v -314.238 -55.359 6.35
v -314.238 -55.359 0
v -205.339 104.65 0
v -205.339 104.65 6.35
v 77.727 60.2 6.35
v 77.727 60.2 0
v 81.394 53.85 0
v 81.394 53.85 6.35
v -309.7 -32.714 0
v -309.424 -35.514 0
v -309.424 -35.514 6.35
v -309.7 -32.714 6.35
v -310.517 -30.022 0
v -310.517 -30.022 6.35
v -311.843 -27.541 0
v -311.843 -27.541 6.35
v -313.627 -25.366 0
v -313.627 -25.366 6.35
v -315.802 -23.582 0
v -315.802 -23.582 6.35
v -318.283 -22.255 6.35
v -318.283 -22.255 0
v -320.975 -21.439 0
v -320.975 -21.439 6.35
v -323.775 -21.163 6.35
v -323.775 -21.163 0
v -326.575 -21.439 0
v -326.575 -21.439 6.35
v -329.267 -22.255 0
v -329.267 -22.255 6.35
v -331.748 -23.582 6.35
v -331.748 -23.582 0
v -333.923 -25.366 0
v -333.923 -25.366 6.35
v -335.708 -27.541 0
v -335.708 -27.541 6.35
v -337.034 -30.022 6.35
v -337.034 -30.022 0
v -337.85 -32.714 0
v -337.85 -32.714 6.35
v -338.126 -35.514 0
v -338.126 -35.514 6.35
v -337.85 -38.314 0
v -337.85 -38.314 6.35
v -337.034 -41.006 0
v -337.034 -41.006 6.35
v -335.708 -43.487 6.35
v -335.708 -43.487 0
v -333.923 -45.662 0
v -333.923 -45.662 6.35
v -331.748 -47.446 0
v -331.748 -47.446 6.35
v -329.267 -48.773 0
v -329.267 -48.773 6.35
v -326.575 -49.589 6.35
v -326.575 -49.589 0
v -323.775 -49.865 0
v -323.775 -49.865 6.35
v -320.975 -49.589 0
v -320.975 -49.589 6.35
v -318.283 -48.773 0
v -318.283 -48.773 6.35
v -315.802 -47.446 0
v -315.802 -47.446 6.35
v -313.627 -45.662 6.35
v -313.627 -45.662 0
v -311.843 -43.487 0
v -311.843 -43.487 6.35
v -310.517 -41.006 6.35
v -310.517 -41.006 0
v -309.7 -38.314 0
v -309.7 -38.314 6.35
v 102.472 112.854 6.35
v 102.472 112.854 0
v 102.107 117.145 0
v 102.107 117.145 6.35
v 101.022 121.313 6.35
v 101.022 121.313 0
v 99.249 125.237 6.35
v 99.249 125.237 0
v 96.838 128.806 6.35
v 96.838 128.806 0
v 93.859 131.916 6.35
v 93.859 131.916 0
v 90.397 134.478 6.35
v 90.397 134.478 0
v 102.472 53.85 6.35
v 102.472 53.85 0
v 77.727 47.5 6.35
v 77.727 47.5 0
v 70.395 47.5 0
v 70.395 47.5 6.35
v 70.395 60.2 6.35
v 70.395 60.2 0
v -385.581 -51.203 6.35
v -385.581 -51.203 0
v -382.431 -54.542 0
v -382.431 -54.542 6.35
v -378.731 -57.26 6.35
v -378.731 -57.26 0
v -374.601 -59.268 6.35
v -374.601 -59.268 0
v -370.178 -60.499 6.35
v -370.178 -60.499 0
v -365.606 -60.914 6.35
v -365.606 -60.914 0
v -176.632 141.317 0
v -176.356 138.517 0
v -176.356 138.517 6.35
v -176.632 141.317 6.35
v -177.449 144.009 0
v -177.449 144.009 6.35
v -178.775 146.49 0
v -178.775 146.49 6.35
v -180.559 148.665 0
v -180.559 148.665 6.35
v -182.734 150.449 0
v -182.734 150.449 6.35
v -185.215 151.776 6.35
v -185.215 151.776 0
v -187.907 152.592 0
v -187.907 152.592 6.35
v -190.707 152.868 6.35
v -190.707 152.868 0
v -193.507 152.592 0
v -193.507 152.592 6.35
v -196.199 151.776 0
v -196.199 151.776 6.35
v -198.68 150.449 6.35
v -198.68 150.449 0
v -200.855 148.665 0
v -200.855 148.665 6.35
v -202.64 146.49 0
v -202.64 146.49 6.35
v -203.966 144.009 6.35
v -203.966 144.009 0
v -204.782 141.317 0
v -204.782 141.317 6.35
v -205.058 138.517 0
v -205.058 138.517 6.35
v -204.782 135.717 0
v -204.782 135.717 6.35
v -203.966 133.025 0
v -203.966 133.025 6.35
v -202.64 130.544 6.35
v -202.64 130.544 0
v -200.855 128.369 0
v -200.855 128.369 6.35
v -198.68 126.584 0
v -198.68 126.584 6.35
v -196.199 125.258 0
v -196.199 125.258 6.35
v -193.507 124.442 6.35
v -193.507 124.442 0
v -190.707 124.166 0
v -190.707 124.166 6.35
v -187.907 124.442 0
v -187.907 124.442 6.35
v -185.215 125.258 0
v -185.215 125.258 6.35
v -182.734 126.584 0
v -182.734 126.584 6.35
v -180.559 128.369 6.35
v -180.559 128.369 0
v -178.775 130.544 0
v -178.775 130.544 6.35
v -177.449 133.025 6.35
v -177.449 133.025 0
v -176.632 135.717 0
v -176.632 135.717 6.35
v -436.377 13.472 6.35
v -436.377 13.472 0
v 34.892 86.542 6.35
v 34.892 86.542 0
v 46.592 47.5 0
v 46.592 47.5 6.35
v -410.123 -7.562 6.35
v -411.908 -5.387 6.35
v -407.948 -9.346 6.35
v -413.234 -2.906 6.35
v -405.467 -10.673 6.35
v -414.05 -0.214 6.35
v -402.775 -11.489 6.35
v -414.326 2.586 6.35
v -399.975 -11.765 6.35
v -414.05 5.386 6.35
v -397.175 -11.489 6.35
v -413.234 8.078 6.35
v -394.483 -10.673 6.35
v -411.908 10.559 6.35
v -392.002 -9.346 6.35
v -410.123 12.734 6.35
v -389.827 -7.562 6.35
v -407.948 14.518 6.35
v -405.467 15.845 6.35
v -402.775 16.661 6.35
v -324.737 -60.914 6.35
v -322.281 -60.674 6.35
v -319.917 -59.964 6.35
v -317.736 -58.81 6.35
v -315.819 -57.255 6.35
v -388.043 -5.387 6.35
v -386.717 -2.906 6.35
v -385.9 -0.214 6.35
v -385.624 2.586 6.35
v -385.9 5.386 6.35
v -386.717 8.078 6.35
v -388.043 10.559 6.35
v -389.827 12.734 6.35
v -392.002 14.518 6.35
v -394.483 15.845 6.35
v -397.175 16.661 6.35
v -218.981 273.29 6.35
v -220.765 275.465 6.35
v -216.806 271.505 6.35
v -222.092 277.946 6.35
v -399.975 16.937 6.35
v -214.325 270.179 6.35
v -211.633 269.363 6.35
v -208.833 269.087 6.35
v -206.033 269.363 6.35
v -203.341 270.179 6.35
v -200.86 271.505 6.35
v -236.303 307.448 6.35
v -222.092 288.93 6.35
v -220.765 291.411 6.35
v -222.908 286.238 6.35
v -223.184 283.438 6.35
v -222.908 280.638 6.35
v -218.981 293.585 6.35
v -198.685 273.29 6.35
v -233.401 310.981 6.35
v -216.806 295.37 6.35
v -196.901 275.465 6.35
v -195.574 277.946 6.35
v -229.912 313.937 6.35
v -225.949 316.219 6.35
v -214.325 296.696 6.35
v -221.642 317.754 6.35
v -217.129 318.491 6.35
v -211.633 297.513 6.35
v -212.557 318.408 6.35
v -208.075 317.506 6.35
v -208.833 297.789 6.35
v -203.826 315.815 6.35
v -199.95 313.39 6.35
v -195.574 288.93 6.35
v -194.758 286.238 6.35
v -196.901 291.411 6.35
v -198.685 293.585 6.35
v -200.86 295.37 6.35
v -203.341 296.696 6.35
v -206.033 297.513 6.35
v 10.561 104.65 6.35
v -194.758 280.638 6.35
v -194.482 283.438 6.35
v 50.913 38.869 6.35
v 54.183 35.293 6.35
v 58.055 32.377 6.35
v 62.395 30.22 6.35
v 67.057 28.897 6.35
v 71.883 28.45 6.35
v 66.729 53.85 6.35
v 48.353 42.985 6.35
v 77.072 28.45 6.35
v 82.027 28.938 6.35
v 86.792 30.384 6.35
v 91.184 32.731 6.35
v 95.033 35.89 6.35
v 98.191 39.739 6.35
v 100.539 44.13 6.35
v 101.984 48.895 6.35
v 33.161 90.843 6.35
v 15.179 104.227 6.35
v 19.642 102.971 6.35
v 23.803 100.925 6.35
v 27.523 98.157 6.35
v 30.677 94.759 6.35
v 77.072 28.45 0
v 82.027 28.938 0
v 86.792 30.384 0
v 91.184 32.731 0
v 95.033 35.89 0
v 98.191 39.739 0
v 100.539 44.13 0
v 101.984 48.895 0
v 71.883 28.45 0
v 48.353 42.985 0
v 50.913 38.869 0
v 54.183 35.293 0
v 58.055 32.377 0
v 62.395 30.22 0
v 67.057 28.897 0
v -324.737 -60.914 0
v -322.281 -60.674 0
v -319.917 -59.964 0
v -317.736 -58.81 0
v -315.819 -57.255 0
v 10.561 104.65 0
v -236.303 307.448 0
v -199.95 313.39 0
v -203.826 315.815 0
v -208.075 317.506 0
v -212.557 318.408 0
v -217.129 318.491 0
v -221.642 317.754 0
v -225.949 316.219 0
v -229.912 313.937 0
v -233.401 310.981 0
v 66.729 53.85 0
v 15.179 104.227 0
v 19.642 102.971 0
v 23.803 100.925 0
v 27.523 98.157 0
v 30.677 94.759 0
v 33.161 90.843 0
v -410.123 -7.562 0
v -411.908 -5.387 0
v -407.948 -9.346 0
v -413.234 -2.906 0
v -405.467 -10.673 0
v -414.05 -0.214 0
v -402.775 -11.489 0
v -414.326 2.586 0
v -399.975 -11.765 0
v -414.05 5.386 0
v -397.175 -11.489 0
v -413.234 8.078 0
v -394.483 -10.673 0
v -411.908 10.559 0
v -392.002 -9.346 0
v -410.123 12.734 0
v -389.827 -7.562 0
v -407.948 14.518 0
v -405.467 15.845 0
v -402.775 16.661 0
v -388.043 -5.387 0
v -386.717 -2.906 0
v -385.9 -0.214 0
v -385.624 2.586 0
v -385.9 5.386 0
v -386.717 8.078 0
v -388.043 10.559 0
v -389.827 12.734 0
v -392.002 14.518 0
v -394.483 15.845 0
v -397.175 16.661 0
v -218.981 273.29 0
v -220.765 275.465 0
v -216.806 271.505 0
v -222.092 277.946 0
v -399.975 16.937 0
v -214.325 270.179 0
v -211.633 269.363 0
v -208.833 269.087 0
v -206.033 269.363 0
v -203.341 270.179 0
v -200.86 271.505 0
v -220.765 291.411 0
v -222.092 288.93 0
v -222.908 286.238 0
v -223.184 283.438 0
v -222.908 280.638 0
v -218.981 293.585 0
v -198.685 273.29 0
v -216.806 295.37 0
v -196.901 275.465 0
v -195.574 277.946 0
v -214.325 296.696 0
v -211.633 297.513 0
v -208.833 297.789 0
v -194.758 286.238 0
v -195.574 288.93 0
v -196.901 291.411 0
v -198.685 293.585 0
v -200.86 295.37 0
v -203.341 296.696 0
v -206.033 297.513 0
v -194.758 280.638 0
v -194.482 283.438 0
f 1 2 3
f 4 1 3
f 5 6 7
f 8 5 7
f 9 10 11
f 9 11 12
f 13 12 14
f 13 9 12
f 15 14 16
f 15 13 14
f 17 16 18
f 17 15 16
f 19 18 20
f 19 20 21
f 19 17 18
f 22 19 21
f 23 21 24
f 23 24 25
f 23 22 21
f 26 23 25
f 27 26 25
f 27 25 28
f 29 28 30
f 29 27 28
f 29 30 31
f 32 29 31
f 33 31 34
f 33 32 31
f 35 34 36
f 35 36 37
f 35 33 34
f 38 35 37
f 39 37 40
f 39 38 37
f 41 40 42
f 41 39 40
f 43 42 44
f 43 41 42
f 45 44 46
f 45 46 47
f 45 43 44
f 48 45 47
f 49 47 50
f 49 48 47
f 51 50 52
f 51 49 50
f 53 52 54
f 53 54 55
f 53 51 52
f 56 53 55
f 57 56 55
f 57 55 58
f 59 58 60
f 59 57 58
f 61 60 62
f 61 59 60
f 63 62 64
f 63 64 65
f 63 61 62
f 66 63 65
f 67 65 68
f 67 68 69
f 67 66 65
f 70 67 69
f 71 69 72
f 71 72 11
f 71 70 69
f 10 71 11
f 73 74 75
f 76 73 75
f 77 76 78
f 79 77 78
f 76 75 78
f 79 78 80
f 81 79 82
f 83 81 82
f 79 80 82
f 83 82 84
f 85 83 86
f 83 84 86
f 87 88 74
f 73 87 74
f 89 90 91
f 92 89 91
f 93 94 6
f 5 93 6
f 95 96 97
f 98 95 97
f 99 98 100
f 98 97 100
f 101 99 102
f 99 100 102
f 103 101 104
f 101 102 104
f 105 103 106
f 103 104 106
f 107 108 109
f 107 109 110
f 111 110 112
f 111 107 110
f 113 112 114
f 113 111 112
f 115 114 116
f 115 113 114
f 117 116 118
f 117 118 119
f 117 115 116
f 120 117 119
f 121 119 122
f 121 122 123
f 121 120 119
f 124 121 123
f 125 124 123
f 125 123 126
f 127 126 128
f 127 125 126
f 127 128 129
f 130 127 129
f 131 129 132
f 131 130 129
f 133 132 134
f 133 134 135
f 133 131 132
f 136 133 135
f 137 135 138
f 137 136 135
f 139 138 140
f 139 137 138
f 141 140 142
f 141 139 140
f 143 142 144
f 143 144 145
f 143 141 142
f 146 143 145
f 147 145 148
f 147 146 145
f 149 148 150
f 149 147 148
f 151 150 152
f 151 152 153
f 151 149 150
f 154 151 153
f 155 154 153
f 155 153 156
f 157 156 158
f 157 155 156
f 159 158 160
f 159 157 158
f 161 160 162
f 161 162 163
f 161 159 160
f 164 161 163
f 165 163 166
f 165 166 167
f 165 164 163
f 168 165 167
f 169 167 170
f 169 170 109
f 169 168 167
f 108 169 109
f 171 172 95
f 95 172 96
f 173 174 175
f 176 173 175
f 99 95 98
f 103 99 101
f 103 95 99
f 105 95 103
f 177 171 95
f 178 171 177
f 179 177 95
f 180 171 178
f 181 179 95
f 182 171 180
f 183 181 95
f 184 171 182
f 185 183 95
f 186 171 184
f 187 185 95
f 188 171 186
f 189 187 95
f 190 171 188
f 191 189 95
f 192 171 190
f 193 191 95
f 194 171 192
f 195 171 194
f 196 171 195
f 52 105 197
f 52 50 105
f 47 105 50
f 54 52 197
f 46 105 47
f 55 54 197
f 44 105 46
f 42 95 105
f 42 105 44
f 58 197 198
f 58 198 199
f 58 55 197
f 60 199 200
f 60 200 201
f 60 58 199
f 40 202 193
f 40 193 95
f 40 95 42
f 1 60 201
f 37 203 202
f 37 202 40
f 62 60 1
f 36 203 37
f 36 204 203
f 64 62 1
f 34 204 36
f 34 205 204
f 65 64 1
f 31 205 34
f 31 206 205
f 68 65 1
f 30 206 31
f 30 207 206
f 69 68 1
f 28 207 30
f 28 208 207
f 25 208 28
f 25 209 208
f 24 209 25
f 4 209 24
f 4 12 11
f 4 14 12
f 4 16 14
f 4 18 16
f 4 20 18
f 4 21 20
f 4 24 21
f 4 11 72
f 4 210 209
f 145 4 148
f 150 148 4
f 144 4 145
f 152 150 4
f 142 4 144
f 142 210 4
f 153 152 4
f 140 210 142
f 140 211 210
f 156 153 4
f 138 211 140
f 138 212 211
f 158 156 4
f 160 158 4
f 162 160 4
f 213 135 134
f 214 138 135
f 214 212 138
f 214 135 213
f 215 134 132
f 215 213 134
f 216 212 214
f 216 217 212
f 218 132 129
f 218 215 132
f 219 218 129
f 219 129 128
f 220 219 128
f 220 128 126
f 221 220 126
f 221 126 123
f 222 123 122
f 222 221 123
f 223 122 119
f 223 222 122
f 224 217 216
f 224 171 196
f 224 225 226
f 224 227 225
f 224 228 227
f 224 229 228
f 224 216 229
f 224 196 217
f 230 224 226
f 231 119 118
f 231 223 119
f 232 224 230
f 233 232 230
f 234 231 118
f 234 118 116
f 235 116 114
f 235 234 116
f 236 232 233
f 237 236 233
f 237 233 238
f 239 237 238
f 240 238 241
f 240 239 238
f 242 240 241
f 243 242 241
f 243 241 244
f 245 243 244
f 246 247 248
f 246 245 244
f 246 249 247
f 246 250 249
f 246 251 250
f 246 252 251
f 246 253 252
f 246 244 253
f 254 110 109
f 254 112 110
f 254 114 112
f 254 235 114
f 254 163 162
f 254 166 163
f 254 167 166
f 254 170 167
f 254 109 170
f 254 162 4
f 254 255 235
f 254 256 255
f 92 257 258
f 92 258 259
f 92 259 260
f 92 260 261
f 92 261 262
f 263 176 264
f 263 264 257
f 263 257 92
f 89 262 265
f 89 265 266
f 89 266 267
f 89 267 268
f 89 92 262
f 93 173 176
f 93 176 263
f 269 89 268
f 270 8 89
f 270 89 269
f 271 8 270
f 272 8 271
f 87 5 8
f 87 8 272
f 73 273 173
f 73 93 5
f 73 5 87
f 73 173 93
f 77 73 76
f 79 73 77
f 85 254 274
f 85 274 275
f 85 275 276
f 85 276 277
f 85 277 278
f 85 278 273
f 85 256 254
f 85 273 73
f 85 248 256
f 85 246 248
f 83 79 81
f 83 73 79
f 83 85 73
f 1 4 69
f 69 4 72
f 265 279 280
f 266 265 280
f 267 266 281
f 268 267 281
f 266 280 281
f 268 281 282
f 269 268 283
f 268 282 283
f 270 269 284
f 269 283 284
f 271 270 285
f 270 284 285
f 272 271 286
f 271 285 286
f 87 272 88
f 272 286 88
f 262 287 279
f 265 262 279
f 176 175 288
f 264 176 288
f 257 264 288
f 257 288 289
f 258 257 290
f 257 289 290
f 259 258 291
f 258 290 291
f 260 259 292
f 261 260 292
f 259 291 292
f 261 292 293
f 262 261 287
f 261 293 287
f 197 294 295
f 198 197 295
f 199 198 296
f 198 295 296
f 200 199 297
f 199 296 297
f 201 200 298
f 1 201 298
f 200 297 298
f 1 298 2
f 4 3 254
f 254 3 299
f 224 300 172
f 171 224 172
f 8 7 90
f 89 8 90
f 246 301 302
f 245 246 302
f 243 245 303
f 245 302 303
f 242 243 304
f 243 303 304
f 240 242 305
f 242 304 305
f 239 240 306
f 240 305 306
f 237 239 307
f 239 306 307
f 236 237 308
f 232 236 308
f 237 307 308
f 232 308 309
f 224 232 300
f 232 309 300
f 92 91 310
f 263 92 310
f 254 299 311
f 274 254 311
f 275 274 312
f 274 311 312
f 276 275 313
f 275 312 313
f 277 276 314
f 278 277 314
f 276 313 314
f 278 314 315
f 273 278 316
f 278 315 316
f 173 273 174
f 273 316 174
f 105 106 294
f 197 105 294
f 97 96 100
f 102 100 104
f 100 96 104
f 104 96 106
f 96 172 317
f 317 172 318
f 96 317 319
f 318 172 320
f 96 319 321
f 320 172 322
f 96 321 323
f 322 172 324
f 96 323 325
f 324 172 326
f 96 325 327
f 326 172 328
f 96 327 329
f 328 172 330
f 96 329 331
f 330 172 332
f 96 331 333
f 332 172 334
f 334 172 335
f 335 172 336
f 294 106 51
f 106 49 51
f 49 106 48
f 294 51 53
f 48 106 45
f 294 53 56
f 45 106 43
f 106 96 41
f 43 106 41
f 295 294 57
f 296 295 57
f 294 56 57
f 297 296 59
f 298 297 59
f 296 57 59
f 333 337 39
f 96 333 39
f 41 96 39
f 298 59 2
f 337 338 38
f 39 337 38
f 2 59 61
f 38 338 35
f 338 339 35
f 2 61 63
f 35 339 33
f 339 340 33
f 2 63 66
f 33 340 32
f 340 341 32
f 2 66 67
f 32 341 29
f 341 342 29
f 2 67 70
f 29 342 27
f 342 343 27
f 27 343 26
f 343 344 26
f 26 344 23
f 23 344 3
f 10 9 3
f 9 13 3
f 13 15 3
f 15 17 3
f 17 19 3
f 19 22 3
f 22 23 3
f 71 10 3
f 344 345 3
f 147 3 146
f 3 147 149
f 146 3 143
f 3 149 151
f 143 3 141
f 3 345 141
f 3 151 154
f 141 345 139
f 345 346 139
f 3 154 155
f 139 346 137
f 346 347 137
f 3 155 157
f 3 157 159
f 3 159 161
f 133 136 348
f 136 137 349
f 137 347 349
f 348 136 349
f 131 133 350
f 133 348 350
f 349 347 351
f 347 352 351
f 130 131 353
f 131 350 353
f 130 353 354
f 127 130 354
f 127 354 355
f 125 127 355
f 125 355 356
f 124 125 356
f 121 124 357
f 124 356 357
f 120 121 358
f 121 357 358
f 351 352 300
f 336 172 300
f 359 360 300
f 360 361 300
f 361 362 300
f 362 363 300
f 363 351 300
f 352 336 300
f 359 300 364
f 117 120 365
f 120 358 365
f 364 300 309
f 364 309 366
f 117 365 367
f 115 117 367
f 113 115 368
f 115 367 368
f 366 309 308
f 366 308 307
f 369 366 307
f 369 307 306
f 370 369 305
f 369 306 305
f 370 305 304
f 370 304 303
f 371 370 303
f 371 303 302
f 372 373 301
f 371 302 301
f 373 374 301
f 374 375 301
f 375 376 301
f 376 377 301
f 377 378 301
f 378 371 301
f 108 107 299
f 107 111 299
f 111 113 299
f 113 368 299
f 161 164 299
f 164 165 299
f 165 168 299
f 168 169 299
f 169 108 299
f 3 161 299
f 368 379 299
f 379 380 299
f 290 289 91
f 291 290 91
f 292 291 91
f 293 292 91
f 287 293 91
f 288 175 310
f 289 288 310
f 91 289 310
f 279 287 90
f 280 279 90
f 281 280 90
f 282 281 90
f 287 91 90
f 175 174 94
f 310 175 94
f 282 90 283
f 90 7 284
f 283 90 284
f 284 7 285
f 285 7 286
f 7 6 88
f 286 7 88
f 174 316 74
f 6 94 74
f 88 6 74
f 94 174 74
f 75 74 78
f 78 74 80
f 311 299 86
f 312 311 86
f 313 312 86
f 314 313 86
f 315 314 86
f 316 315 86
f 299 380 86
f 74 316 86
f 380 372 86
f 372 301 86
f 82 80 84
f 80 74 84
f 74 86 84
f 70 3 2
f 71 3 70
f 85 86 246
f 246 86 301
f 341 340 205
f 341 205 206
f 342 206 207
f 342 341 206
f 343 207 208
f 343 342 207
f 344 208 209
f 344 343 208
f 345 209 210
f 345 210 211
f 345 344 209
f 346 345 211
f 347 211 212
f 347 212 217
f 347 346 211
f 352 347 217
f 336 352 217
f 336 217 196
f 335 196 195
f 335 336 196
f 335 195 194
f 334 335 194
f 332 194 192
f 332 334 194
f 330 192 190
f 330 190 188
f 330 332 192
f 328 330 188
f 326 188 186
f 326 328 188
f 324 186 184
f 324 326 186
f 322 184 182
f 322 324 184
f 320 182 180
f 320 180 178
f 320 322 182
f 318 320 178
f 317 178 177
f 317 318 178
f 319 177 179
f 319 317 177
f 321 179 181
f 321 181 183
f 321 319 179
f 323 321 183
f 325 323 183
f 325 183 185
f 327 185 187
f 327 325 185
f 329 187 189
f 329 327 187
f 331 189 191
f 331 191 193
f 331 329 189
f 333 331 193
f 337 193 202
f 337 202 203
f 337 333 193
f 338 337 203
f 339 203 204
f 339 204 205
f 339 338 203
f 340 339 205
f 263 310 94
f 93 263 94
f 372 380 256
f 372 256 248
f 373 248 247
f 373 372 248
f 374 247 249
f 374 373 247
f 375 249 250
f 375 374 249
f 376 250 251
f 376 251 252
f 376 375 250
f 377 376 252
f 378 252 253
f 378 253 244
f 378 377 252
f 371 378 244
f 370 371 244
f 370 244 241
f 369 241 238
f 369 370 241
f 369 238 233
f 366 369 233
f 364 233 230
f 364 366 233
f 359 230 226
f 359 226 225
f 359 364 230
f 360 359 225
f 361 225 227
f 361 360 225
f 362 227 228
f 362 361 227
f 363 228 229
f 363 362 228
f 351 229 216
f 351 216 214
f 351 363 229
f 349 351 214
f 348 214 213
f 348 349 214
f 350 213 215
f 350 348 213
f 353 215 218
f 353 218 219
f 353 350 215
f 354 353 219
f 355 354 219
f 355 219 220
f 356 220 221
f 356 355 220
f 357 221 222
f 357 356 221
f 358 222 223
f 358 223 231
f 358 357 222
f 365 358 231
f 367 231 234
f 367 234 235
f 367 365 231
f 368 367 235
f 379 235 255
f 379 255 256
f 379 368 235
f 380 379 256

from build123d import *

# Parameters (mm, degrees)
MODEL_R             = 14.351
BOSS_EXTRUDE1_DEPTH = 6.35


with BuildPart() as part:
    # Model → Boss-Extrude1 (new body)
    with BuildSketch(Plane.XY):
        with BuildLine():
            Line((-314.23831963, -55.359484793), (-205.338802982, 104.650248016))
            Line((-205.338802982, 104.650248016), (-11.396613492, 104.650248016))
            Line((-11.396613492, 104.650248016), (-2.138802982, 104.650248016))
            Line((-2.138802982, 104.650248016), (10.561197018, 104.650248016))
            ThreePointArc((10.561197018, 104.650248016), (25.72621731, 99.626267243), (34.892121825, 86.541756641))
            Line((34.892121825, 86.541756641), (46.592108535, 47.500248016))
            ThreePointArc((46.592108535, 47.500248016), (56.051698972, 33.745564192), (71.88314884, 28.450248016))
            Line((71.88314884, 28.450248016), (77.072108535, 28.450248016))
            ThreePointArc((77.072108535, 28.450248016), (95.032620777, 35.889735774), (102.472108535, 53.850248016))
            Line((102.472108535, 53.850248016), (102.472108535, 83.872407327))
            Line((102.472108535, 83.872407327), (102.472108535, 112.853785651))
            ThreePointArc((102.472108535, 112.853785651), (99.24880288, 125.237413065), (90.396972478, 134.478031323))
            Line((90.396972478, 134.478031323), (-199.949582693, 313.389629113))
            ThreePointArc((-199.949582693, 313.389629113), (-219.402189514, 318.224062751), (-236.303247901, 307.447705012))
            Line((-236.303247901, 307.447705012), (-436.377385414, 13.472026599))
            Line((-436.377385414, 13.472026599), (-385.58146606, -51.20282143))
            ThreePointArc((-385.58146606, -51.20282143), (-376.71145599, -58.357541068), (-365.605974805, -60.913979882))
            Line((-365.605974805, -60.913979882), (-324.737451002, -60.913979882))
            ThreePointArc((-324.737451002, -60.913979882), (-318.798508014, -59.439796386), (-314.23831963, -55.359484793))
        make_face()
        with Locations((-323.775189267, -35.513979882)):
            Circle(MODEL_R, mode=Mode.SUBTRACT)
        with Locations((-399.975189267, 2.586020118)):
            Circle(MODEL_R, mode=Mode.SUBTRACT)
        Polygon((77.727371227, 60.200248016), (81.393545437, 53.850248016), (77.727371227, 47.500248016), (70.395022809, 47.500248016), (66.728848599, 53.850248016), (70.395022809, 60.200248016), align=None, mode=Mode.SUBTRACT)
        with Locations((-190.707148919, 138.516914683)):
            Circle(MODEL_R, mode=Mode.SUBTRACT)
        with Locations((-208.832932893, 283.437784316)):
            Circle(MODEL_R, mode=Mode.SUBTRACT)
    extrude(amount=BOSS_EXTRUDE1_DEPTH)


solid = part.part
